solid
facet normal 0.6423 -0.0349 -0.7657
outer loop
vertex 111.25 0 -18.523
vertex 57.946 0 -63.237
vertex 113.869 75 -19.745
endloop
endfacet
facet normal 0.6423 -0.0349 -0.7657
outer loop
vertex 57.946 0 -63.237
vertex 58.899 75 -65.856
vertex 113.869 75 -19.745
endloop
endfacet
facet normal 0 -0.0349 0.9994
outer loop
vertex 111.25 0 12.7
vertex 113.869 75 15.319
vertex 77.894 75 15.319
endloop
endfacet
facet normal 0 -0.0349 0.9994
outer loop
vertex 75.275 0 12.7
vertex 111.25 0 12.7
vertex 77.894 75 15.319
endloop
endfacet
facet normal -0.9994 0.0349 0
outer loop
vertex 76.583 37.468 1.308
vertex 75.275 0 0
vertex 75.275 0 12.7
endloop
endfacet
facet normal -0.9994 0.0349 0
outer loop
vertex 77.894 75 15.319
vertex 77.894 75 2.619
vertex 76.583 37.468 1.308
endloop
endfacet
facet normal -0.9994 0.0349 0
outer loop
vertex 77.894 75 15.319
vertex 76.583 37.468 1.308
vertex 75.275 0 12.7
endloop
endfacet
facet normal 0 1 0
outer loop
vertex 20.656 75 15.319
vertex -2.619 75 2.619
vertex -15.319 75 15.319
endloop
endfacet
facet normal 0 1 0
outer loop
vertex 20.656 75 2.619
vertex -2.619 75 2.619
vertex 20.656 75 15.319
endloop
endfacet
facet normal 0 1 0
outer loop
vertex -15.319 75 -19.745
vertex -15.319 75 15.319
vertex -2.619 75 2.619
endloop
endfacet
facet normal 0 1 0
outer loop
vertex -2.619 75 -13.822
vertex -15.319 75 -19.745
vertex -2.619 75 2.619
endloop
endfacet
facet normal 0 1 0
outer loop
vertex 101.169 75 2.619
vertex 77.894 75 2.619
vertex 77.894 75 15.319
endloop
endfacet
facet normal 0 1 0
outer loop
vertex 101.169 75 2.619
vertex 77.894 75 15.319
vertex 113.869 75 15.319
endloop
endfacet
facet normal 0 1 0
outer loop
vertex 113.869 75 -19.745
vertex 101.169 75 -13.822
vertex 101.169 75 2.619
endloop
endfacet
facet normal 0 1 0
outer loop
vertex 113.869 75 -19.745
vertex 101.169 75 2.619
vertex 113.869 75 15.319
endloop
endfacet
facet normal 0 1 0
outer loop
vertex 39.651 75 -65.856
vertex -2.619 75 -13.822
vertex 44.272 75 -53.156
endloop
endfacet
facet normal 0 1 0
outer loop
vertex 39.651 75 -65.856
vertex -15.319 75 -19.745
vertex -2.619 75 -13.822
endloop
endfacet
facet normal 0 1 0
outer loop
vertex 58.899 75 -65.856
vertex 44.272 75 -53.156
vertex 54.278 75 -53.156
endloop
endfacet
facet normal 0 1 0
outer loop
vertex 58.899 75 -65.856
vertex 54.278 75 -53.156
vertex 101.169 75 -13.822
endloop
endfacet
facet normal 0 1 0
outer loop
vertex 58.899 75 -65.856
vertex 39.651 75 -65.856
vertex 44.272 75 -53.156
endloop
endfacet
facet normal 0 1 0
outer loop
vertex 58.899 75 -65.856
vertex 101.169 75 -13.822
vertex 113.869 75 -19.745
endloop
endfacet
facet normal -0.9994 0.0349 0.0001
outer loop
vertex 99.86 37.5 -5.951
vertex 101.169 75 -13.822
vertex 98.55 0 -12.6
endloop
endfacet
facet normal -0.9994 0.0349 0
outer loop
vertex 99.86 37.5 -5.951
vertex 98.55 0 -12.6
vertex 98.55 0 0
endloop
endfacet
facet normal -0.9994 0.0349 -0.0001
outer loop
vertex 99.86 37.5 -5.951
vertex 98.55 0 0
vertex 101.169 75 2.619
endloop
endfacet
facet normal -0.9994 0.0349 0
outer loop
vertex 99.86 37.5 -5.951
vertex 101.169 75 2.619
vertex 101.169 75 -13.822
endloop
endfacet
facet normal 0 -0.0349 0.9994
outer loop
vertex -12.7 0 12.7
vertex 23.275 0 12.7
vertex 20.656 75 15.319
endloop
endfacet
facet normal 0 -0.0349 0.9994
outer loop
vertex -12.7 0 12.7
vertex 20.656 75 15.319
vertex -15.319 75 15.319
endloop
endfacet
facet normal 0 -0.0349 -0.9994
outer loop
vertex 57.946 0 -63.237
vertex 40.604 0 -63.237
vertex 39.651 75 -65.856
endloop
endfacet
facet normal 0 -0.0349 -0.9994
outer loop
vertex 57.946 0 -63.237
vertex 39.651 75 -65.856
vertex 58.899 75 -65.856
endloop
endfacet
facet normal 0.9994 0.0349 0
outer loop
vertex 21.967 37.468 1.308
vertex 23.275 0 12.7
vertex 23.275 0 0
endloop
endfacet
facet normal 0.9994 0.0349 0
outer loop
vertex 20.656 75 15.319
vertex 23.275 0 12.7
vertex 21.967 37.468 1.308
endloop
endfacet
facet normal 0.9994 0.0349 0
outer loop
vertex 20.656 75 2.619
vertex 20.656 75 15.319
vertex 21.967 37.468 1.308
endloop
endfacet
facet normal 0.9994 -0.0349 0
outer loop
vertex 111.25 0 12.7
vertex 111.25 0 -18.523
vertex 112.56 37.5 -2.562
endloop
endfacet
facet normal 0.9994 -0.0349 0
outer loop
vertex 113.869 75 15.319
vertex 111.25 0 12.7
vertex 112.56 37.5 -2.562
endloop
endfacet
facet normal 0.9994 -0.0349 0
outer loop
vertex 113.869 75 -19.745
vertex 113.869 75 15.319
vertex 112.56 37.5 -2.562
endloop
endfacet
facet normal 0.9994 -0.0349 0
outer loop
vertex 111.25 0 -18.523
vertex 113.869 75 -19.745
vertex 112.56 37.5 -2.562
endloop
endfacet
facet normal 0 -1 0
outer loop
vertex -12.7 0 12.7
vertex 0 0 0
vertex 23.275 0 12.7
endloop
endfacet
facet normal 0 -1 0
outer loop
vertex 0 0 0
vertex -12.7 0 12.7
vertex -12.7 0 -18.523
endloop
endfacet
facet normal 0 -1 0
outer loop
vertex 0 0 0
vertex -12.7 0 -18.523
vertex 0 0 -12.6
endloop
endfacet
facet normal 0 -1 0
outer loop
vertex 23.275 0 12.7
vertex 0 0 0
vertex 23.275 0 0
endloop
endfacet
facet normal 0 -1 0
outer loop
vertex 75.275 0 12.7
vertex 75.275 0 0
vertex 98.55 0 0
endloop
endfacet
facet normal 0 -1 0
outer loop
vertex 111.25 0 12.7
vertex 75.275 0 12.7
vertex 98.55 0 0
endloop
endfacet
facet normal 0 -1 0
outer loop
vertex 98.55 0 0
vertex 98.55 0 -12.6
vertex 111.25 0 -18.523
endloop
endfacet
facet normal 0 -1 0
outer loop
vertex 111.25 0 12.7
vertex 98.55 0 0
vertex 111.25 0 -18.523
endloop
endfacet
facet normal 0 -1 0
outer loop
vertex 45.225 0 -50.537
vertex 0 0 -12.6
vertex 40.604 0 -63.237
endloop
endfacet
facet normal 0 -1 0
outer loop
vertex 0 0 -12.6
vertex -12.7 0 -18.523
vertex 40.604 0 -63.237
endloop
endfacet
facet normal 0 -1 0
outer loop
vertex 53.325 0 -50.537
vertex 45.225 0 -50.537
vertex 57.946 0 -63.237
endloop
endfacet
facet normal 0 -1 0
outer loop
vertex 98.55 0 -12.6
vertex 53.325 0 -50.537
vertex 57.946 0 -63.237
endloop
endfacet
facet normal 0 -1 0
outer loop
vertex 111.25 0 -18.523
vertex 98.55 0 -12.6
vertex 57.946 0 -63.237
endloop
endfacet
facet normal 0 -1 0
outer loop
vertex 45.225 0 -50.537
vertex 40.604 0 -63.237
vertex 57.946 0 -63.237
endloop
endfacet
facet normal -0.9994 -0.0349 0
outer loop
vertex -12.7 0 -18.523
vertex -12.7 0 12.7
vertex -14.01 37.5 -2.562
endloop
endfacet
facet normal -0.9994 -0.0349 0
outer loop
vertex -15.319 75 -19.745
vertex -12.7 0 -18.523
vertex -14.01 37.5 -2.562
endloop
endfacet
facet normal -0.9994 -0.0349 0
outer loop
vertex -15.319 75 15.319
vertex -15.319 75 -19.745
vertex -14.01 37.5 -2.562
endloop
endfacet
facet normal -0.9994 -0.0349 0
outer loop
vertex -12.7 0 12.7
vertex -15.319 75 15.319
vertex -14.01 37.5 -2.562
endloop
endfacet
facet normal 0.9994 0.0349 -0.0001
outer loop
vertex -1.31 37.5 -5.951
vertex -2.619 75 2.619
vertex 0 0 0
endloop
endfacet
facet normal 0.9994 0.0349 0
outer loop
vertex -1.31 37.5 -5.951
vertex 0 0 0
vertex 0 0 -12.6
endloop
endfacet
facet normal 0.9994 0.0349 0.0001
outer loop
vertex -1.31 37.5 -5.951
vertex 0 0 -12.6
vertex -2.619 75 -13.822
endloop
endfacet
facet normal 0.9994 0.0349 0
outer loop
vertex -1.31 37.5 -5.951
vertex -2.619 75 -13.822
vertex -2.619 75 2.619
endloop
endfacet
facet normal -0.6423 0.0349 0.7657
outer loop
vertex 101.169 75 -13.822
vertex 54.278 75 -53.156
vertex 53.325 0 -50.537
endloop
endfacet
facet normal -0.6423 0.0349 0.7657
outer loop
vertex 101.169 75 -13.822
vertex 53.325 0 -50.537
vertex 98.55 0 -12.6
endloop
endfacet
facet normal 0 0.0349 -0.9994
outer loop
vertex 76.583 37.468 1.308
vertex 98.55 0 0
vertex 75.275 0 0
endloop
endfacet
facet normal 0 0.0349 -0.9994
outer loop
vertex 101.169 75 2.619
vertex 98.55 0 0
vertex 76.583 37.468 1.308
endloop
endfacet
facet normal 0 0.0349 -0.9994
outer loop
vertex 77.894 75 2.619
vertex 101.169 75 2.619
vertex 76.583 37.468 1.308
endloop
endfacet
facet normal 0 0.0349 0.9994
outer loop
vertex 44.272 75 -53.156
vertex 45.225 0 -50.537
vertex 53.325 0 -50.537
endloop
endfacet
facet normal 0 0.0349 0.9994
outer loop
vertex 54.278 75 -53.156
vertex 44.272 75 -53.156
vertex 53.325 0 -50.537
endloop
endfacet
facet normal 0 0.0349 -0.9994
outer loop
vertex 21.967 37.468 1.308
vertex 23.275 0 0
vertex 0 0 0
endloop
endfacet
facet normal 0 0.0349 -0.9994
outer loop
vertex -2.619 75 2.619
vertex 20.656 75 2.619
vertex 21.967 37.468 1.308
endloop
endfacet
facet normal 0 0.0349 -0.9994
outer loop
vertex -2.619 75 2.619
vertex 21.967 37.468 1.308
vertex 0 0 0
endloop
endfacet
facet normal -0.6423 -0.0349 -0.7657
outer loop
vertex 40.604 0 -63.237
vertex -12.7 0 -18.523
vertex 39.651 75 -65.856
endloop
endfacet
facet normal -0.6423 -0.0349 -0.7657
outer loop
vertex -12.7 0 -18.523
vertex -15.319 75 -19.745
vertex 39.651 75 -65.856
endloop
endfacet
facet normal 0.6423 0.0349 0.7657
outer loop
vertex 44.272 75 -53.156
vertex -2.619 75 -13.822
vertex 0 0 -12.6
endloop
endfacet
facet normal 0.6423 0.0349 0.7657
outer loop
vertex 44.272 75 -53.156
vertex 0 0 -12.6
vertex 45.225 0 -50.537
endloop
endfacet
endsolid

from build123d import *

# Parameters (mm, degrees)
SALIENTE_EXTRUIR1_DEPTH = 8
SALIENTE_EXTRUIR1_TAPER = -2
SALIENTE_EXTRUIR3_DEPTH = 75
SALIENTE_EXTRUIR3_TAPER = -2
CORTAR_EXTRUIR3_DEPTH   = 76.0000001
CORTAR_EXTRUIR3_TAPER   = -2
CROQUIS14_W             = 52
CROQUIS14_H             = 12.7
CORTAR_EXTRUIR4_DEPTH   = 76.0000001
CORTAR_EXTRUIR4_TAPER   = -2


with BuildPart() as part:
    # Croquis1 → Saliente-Extruir1 (new body)
    with BuildSketch(Plane(origin=(0, 0, 0), x_dir=(1, 0, 0), z_dir=(0, 1, 0))):
        Polygon((0, 0), (98.55, 0), (98.55, 12.6), (53.325, 50.537320346), (45.225, 50.537320346), (0, 12.6), align=None)
    extrude(amount=SALIENTE_EXTRUIR1_DEPTH, taper=SALIENTE_EXTRUIR1_TAPER)

    # Croquis10 → Saliente-Extruir3 (add)
    with BuildSketch(Plane.XZ):
        Polygon((-12.7, 12.7), (-12.7, -18.52320689), (40.60360085, -63.237320346), (57.94639915, -63.237320346), (111.25, -18.52320689), (111.25, 12.7), align=None)
    extrude(amount=-SALIENTE_EXTRUIR3_DEPTH, taper=SALIENTE_EXTRUIR3_TAPER)

    # Croquis11 → Cortar-Extruir3 (cut, through all)
    with BuildSketch(Plane.XZ):
        Polygon((98.55, 0), (0, 0), (0, -12.6), (45.225, -50.537320346), (53.325, -50.537320346), (98.55, -12.6), align=None)
    extrude(amount=-CORTAR_EXTRUIR3_DEPTH, taper=CORTAR_EXTRUIR3_TAPER, mode=Mode.SUBTRACT)

    # Croquis14 → Cortar-Extruir4 (cut, through all)
    with BuildSketch(Plane.XZ):
        with Locations((49.275, 6.35)):
            Rectangle(CROQUIS14_W, CROQUIS14_H)
    extrude(amount=-CORTAR_EXTRUIR4_DEPTH, taper=CORTAR_EXTRUIR4_TAPER, mode=Mode.SUBTRACT)


solid = part.part
